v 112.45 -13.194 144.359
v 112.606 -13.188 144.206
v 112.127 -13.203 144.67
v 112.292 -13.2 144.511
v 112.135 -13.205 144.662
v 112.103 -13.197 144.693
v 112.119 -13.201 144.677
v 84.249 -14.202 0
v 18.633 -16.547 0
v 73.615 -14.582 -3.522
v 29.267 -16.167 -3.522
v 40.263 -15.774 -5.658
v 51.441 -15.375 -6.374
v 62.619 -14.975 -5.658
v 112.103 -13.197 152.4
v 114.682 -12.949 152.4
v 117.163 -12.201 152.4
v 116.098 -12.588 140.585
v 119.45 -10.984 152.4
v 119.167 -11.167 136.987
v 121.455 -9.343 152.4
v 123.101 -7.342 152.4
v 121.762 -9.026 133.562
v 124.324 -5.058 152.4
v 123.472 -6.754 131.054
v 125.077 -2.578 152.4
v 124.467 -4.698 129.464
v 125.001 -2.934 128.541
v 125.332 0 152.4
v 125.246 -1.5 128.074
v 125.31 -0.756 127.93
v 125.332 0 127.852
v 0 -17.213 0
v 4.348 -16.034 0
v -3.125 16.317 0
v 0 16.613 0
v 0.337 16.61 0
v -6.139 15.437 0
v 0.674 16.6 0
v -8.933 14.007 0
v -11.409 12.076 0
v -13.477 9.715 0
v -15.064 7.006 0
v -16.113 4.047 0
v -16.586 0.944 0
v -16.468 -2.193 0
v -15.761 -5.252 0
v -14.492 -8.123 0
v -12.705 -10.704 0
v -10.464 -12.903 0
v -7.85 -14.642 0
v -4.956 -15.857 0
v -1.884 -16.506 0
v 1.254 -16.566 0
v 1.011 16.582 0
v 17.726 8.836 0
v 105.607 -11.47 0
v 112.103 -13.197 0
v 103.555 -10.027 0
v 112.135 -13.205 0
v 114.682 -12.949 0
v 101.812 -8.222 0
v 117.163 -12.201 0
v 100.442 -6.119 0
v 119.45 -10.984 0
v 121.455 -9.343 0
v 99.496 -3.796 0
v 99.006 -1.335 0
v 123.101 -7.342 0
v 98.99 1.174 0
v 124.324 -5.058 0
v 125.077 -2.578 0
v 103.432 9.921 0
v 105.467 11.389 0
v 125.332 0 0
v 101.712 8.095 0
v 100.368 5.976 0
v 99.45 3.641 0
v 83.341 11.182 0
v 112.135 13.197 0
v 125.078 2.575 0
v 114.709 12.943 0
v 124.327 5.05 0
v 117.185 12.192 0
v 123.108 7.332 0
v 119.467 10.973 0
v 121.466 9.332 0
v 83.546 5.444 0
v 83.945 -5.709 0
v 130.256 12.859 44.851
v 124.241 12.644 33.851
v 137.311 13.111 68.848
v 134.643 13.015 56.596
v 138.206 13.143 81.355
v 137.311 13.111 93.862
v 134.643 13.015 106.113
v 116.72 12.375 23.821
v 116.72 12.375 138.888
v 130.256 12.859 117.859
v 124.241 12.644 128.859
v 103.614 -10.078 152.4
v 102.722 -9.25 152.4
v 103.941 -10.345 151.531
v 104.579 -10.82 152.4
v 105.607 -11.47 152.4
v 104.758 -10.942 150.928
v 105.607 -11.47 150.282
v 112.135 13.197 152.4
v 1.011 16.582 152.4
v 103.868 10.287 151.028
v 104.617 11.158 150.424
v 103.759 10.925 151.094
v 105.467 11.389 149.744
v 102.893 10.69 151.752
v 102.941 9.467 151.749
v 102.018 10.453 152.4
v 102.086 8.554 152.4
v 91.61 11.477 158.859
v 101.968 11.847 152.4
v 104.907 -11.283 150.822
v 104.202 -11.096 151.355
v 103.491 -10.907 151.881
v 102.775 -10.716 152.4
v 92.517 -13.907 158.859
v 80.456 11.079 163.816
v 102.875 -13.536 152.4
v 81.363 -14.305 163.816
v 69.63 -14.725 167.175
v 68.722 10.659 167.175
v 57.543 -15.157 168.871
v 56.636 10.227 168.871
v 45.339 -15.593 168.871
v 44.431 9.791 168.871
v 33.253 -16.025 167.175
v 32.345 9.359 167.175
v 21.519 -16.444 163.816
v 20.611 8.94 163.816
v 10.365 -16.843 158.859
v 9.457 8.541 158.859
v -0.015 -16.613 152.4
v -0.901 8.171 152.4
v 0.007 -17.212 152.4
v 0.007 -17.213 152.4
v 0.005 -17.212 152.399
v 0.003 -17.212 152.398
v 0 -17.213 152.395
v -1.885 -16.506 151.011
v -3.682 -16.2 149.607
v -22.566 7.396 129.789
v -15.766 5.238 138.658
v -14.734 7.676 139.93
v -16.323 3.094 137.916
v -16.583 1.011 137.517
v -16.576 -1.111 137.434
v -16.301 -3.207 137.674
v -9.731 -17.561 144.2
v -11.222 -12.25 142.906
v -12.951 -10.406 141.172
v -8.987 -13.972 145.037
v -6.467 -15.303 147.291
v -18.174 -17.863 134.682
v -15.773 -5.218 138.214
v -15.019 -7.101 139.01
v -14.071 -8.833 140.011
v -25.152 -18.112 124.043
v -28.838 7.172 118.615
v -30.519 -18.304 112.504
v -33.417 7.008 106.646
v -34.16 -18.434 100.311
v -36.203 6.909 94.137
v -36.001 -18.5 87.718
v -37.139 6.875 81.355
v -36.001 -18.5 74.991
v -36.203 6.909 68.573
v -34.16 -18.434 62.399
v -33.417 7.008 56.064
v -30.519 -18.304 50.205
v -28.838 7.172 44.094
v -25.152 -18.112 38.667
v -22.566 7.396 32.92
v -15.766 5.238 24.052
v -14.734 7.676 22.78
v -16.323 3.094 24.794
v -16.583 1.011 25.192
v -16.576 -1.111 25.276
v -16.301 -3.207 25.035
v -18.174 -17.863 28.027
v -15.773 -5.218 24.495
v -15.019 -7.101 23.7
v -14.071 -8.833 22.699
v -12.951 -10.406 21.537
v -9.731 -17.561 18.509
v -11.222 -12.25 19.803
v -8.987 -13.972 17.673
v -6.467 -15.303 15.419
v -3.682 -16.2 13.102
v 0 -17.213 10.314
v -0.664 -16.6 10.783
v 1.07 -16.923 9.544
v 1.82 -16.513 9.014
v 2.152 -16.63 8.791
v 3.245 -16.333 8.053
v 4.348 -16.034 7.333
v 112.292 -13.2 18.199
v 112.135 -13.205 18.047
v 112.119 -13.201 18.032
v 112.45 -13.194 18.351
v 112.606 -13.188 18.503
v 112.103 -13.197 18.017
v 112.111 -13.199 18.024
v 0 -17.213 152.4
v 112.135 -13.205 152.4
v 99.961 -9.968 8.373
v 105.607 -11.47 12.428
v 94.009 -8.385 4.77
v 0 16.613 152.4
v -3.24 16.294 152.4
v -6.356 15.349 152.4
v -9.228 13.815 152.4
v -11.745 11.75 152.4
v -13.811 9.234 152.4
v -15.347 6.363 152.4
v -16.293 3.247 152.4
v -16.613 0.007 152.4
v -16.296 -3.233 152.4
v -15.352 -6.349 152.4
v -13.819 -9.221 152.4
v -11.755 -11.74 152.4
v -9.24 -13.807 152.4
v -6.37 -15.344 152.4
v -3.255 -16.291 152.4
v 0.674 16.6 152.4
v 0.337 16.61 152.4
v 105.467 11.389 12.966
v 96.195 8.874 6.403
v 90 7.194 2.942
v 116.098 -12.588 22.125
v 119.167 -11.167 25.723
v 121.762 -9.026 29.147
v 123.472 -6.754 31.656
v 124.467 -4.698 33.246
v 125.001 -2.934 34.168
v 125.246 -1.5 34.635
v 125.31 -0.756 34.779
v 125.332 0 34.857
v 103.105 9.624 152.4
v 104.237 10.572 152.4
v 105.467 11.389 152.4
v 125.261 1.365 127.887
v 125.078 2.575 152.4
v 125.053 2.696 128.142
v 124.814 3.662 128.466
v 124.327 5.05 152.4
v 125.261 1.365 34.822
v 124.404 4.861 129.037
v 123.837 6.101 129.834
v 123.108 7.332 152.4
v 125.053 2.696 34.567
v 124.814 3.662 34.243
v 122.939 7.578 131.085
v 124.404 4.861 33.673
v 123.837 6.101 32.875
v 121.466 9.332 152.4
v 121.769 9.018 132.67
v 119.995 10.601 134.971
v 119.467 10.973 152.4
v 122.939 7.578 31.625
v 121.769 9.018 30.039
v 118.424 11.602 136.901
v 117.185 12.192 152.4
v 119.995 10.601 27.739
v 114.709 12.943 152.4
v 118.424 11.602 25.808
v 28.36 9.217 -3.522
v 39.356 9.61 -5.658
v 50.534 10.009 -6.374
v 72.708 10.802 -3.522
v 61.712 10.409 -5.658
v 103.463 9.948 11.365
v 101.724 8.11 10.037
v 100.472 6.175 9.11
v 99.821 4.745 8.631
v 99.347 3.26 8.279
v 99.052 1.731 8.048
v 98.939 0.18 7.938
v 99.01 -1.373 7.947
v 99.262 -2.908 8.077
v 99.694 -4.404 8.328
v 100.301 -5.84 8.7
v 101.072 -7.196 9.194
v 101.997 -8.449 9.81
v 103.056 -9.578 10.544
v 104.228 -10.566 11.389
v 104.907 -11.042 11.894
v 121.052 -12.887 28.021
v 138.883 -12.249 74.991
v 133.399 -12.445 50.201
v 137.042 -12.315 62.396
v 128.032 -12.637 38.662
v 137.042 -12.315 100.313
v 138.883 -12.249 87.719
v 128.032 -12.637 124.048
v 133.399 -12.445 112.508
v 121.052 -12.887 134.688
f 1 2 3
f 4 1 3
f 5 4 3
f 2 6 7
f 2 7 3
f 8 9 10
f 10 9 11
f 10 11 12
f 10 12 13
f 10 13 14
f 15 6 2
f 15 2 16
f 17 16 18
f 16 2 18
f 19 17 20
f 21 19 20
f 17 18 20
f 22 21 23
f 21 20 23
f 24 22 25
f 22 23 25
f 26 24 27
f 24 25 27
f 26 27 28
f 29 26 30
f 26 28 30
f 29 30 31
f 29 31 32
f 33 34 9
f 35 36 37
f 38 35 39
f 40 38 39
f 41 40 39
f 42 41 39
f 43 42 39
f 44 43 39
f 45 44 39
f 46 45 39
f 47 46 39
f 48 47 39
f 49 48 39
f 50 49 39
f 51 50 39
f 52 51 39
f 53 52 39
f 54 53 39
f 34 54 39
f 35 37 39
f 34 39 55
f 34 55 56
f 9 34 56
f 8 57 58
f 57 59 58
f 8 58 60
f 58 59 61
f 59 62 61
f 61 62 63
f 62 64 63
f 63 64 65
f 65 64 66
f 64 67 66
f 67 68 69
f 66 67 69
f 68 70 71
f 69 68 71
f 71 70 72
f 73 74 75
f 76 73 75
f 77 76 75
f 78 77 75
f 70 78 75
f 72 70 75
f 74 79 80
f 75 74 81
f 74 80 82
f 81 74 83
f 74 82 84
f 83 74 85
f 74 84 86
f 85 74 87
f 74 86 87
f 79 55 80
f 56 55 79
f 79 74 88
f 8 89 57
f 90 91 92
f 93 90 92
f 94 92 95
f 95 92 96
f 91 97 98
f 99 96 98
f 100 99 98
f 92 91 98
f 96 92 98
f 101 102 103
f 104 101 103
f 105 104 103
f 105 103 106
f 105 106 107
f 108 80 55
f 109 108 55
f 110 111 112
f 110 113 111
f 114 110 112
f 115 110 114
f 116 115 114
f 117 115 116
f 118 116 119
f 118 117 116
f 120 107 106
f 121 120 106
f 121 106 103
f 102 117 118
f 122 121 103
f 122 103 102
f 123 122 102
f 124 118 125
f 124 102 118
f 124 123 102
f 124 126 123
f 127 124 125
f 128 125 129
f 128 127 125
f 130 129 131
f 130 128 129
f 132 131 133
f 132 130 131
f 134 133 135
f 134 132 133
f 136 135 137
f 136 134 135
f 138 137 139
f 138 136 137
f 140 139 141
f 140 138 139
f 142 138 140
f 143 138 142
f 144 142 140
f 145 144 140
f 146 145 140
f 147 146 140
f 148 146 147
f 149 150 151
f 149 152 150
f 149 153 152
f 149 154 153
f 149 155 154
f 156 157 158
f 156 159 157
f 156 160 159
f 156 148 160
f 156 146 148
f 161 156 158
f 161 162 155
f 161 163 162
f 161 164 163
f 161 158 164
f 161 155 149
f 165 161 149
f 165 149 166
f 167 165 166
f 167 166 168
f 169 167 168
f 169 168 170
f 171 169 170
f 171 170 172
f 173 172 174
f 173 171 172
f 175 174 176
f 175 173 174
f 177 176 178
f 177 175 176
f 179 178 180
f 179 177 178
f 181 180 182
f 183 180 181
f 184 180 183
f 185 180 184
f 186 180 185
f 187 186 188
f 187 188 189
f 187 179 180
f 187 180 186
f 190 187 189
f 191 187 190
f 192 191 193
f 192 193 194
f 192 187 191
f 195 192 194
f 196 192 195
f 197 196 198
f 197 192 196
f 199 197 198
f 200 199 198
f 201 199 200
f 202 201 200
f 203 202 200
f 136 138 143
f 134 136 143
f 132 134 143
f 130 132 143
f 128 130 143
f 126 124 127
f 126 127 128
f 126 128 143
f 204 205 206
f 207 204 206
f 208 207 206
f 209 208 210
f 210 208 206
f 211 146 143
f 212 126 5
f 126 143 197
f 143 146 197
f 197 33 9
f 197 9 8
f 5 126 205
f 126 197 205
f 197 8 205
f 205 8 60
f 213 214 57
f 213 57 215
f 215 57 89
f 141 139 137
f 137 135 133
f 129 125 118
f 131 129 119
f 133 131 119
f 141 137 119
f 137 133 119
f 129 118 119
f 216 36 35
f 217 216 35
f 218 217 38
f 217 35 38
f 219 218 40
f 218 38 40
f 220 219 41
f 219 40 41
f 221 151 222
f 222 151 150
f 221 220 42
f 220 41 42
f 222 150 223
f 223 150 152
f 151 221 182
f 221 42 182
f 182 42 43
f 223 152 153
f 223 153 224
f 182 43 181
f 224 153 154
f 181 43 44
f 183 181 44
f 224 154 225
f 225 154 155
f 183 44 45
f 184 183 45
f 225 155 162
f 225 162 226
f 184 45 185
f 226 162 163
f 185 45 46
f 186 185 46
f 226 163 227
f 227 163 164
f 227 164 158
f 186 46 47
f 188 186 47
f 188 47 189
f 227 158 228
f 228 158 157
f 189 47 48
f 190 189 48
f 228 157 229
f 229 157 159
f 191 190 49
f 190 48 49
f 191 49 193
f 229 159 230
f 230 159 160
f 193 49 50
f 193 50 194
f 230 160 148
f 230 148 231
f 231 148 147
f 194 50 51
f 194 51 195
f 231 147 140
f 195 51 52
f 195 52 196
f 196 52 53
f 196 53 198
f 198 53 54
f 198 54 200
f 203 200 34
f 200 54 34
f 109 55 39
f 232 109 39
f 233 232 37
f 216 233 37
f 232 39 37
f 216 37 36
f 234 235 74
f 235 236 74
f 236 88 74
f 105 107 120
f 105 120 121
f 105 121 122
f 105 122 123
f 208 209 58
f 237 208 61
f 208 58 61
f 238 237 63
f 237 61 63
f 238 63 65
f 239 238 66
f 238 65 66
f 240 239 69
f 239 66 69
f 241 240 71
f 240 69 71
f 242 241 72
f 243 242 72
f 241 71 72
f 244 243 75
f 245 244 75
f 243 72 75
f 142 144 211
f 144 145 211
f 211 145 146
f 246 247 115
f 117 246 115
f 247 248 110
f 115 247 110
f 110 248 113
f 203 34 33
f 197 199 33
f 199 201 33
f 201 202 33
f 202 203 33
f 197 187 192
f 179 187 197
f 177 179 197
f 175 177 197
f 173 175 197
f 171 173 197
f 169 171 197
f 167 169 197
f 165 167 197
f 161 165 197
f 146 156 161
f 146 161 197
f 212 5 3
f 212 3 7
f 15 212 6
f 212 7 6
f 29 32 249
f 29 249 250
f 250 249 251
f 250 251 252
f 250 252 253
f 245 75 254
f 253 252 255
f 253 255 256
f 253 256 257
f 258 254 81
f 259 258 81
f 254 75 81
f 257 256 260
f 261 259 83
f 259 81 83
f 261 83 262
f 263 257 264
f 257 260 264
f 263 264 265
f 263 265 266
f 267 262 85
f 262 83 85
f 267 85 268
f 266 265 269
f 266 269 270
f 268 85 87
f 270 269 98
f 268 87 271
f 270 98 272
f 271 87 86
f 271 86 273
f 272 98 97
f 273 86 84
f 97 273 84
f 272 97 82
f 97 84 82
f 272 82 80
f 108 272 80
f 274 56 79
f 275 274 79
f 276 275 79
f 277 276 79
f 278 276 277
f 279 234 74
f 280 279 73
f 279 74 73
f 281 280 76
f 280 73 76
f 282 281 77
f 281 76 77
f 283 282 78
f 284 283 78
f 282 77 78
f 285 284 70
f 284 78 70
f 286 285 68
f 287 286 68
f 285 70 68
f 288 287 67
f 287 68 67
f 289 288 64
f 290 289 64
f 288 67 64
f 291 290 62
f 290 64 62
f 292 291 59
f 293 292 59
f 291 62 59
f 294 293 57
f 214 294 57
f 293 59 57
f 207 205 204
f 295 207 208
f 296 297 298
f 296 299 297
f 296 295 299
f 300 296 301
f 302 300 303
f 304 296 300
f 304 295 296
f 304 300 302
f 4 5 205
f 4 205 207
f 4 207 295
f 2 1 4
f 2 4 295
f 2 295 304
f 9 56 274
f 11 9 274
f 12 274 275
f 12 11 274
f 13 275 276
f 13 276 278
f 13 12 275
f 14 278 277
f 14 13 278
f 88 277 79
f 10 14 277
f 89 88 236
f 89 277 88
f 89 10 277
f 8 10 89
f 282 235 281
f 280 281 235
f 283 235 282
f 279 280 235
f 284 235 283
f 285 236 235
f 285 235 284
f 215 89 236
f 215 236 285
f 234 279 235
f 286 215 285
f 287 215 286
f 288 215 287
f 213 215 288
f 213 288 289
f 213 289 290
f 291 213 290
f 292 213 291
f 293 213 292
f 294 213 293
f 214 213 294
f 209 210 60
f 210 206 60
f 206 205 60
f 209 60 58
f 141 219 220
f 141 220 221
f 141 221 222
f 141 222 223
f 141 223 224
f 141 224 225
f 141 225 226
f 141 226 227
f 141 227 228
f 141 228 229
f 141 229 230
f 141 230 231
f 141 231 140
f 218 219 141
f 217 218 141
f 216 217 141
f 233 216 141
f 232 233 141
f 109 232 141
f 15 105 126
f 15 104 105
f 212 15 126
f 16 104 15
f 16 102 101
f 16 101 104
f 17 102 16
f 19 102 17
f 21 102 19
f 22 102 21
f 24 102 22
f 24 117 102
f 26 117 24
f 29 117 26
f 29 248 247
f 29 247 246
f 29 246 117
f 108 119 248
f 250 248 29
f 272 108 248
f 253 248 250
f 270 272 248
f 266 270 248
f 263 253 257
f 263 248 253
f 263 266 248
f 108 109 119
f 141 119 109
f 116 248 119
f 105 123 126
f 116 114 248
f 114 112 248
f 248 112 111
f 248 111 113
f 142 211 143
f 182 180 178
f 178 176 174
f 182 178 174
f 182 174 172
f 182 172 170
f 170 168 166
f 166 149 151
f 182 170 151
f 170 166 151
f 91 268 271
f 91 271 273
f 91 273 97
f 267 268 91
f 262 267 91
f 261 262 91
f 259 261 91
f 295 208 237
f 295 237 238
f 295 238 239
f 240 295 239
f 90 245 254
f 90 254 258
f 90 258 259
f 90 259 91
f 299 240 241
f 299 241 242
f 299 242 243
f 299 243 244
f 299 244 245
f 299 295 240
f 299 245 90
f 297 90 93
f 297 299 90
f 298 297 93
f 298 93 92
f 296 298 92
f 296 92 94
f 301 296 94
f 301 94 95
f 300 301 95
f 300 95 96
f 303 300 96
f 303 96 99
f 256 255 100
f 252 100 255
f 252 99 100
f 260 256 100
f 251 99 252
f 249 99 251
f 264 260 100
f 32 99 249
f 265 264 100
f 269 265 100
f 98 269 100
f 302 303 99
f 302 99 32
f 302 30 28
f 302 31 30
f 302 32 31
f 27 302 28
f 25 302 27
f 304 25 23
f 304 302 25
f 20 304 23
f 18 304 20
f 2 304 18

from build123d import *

# Parameters (mm, degrees)
F1_DEPTH = 152.4
F2_R     = 87.7285820259
F3_DEPTH = 25.4


with BuildPart() as f1:
    # F0 (on Top) → F1 (new body)
    with BuildSketch(Plane.XY):
        with BuildLine():
            ThreePointArc((4.3483612884, -16.0341400475), (13.1955019604, -10.0935930654), (16.6133046971, 0))
            ThreePointArc((16.6133046971, 0), (14.3717652499, 8.3339220395), (8.2520234436, 14.4189459408))
            Line((8.2520234436, 14.4189459408), (0, 16.6133046971))
            ThreePointArc((0, 16.6133046971), (-16.4678770205, -2.1933808143), (4.3483612884, -16.0341400475))
        make_face()
        with BuildLine():
            ThreePointArc((8.2520234436, 14.4189459408), (14.3717652499, 8.3339220395), (16.6133046971, 0))
            ThreePointArc((16.6133046971, 0), (13.1955019604, -10.0935930654), (4.3483612884, -16.0341400475))
            Line((4.3483612884, -16.0341400475), (62.9788908632, -0.1338945288))
            Line((62.9788908632, -0.1338945288), (8.2520234436, 14.4189459408))
        make_face()
        with BuildLine():
            Line((0, 16.6133046971), (8.2520234436, 14.4189459408))
            ThreePointArc((8.2520234436, 14.4189459408), (4.7563486134, 15.9178843075), (1.0113711573, 16.5824914093))
            Line((1.0113711573, 16.5824914093), (0, 16.6133046971))
        make_face()
        with BuildLine():
            ThreePointArc((1.0113711573, 16.5824914093), (4.7563486134, 15.9178843075), (8.2520234436, 14.4189459408))
            Line((8.2520234436, 14.4189459408), (62.9788908632, -0.1338945288))
            Line((62.9788908632, -0.1338945288), (105.4673896361, 11.3887297271))
            ThreePointArc((105.4673896361, 11.3887297271), (108.6807109667, 12.7368450388), (112.1348664165, 13.1969091614))
            Line((112.1348664165, 13.1969091614), (1.0113711573, 16.5824914093))
        make_face()
        with BuildLine():
            Line((62.9788908632, -0.1338945288), (4.3483612884, -16.0341400475))
            Line((4.3483612884, -16.0341400475), (0, -17.2133893668))
            Line((0, -17.2133893668), (112.1348664165, -13.2053364746))
            Line((112.1348664165, -13.2053364746), (112.1030305721, -13.1968707614))
            ThreePointArc((112.1030305721, -13.1968707614), (108.7434350674, -12.7536898511), (105.6074566347, -11.469582946))
            Line((105.6074566347, -11.469582946), (62.9788908632, -0.1338945288))
        make_face()
        with BuildLine():
            Line((0, 16.6133046971), (1.0113711573, 16.5824914093))
            ThreePointArc((1.0113711573, 16.5824914093), (0.5059202201, 16.6055995883), (0, 16.6133046971))
        make_face()
        with BuildLine():
            Line((105.4673896361, 11.3887297271), (112.1348664165, 13.1969091614))
            ThreePointArc((112.1348664165, 13.1969091614), (108.6807109667, 12.7368450388), (105.4673896361, 11.3887297271))
        make_face()
        with BuildLine():
            ThreePointArc((125.3317755778, 0), (121.4664903752, 9.3316239587), (112.1348664165, 13.1969091614))
            Line((112.1348664165, 13.1969091614), (105.4673896361, 11.3887297271))
            ThreePointArc((105.4673896361, 11.3887297271), (98.9382050049, -0.0808640945), (105.6074566347, -11.469582946))
            Line((105.6074566347, -11.469582946), (112.1030305721, -13.1968707614))
            ThreePointArc((112.1030305721, -13.1968707614), (121.455227908, -9.3428728494), (125.3317755778, 0))
        make_face()
        with BuildLine():
            Line((112.1030305721, -13.1968707614), (105.6074566347, -11.469582946))
            ThreePointArc((105.6074566347, -11.469582946), (108.7434350674, -12.7536898511), (112.1030305721, -13.1968707614))
        make_face()
    extrude(amount=F1_DEPTH)

    # F2 (on face) → F3 (join)
    with BuildSketch(Plane(origin=(0.6144756506, -17.1914260739, 0), x_dir=(0.9993618252, 0.0357203355, 0), z_dir=(0.0357203355, -0.9993618252, 0))):
        with Locations((50.8590377867, 81.3547074795)):
            Circle(F2_R)
    extrude(amount=-F3_DEPTH)


solid = f1.part
